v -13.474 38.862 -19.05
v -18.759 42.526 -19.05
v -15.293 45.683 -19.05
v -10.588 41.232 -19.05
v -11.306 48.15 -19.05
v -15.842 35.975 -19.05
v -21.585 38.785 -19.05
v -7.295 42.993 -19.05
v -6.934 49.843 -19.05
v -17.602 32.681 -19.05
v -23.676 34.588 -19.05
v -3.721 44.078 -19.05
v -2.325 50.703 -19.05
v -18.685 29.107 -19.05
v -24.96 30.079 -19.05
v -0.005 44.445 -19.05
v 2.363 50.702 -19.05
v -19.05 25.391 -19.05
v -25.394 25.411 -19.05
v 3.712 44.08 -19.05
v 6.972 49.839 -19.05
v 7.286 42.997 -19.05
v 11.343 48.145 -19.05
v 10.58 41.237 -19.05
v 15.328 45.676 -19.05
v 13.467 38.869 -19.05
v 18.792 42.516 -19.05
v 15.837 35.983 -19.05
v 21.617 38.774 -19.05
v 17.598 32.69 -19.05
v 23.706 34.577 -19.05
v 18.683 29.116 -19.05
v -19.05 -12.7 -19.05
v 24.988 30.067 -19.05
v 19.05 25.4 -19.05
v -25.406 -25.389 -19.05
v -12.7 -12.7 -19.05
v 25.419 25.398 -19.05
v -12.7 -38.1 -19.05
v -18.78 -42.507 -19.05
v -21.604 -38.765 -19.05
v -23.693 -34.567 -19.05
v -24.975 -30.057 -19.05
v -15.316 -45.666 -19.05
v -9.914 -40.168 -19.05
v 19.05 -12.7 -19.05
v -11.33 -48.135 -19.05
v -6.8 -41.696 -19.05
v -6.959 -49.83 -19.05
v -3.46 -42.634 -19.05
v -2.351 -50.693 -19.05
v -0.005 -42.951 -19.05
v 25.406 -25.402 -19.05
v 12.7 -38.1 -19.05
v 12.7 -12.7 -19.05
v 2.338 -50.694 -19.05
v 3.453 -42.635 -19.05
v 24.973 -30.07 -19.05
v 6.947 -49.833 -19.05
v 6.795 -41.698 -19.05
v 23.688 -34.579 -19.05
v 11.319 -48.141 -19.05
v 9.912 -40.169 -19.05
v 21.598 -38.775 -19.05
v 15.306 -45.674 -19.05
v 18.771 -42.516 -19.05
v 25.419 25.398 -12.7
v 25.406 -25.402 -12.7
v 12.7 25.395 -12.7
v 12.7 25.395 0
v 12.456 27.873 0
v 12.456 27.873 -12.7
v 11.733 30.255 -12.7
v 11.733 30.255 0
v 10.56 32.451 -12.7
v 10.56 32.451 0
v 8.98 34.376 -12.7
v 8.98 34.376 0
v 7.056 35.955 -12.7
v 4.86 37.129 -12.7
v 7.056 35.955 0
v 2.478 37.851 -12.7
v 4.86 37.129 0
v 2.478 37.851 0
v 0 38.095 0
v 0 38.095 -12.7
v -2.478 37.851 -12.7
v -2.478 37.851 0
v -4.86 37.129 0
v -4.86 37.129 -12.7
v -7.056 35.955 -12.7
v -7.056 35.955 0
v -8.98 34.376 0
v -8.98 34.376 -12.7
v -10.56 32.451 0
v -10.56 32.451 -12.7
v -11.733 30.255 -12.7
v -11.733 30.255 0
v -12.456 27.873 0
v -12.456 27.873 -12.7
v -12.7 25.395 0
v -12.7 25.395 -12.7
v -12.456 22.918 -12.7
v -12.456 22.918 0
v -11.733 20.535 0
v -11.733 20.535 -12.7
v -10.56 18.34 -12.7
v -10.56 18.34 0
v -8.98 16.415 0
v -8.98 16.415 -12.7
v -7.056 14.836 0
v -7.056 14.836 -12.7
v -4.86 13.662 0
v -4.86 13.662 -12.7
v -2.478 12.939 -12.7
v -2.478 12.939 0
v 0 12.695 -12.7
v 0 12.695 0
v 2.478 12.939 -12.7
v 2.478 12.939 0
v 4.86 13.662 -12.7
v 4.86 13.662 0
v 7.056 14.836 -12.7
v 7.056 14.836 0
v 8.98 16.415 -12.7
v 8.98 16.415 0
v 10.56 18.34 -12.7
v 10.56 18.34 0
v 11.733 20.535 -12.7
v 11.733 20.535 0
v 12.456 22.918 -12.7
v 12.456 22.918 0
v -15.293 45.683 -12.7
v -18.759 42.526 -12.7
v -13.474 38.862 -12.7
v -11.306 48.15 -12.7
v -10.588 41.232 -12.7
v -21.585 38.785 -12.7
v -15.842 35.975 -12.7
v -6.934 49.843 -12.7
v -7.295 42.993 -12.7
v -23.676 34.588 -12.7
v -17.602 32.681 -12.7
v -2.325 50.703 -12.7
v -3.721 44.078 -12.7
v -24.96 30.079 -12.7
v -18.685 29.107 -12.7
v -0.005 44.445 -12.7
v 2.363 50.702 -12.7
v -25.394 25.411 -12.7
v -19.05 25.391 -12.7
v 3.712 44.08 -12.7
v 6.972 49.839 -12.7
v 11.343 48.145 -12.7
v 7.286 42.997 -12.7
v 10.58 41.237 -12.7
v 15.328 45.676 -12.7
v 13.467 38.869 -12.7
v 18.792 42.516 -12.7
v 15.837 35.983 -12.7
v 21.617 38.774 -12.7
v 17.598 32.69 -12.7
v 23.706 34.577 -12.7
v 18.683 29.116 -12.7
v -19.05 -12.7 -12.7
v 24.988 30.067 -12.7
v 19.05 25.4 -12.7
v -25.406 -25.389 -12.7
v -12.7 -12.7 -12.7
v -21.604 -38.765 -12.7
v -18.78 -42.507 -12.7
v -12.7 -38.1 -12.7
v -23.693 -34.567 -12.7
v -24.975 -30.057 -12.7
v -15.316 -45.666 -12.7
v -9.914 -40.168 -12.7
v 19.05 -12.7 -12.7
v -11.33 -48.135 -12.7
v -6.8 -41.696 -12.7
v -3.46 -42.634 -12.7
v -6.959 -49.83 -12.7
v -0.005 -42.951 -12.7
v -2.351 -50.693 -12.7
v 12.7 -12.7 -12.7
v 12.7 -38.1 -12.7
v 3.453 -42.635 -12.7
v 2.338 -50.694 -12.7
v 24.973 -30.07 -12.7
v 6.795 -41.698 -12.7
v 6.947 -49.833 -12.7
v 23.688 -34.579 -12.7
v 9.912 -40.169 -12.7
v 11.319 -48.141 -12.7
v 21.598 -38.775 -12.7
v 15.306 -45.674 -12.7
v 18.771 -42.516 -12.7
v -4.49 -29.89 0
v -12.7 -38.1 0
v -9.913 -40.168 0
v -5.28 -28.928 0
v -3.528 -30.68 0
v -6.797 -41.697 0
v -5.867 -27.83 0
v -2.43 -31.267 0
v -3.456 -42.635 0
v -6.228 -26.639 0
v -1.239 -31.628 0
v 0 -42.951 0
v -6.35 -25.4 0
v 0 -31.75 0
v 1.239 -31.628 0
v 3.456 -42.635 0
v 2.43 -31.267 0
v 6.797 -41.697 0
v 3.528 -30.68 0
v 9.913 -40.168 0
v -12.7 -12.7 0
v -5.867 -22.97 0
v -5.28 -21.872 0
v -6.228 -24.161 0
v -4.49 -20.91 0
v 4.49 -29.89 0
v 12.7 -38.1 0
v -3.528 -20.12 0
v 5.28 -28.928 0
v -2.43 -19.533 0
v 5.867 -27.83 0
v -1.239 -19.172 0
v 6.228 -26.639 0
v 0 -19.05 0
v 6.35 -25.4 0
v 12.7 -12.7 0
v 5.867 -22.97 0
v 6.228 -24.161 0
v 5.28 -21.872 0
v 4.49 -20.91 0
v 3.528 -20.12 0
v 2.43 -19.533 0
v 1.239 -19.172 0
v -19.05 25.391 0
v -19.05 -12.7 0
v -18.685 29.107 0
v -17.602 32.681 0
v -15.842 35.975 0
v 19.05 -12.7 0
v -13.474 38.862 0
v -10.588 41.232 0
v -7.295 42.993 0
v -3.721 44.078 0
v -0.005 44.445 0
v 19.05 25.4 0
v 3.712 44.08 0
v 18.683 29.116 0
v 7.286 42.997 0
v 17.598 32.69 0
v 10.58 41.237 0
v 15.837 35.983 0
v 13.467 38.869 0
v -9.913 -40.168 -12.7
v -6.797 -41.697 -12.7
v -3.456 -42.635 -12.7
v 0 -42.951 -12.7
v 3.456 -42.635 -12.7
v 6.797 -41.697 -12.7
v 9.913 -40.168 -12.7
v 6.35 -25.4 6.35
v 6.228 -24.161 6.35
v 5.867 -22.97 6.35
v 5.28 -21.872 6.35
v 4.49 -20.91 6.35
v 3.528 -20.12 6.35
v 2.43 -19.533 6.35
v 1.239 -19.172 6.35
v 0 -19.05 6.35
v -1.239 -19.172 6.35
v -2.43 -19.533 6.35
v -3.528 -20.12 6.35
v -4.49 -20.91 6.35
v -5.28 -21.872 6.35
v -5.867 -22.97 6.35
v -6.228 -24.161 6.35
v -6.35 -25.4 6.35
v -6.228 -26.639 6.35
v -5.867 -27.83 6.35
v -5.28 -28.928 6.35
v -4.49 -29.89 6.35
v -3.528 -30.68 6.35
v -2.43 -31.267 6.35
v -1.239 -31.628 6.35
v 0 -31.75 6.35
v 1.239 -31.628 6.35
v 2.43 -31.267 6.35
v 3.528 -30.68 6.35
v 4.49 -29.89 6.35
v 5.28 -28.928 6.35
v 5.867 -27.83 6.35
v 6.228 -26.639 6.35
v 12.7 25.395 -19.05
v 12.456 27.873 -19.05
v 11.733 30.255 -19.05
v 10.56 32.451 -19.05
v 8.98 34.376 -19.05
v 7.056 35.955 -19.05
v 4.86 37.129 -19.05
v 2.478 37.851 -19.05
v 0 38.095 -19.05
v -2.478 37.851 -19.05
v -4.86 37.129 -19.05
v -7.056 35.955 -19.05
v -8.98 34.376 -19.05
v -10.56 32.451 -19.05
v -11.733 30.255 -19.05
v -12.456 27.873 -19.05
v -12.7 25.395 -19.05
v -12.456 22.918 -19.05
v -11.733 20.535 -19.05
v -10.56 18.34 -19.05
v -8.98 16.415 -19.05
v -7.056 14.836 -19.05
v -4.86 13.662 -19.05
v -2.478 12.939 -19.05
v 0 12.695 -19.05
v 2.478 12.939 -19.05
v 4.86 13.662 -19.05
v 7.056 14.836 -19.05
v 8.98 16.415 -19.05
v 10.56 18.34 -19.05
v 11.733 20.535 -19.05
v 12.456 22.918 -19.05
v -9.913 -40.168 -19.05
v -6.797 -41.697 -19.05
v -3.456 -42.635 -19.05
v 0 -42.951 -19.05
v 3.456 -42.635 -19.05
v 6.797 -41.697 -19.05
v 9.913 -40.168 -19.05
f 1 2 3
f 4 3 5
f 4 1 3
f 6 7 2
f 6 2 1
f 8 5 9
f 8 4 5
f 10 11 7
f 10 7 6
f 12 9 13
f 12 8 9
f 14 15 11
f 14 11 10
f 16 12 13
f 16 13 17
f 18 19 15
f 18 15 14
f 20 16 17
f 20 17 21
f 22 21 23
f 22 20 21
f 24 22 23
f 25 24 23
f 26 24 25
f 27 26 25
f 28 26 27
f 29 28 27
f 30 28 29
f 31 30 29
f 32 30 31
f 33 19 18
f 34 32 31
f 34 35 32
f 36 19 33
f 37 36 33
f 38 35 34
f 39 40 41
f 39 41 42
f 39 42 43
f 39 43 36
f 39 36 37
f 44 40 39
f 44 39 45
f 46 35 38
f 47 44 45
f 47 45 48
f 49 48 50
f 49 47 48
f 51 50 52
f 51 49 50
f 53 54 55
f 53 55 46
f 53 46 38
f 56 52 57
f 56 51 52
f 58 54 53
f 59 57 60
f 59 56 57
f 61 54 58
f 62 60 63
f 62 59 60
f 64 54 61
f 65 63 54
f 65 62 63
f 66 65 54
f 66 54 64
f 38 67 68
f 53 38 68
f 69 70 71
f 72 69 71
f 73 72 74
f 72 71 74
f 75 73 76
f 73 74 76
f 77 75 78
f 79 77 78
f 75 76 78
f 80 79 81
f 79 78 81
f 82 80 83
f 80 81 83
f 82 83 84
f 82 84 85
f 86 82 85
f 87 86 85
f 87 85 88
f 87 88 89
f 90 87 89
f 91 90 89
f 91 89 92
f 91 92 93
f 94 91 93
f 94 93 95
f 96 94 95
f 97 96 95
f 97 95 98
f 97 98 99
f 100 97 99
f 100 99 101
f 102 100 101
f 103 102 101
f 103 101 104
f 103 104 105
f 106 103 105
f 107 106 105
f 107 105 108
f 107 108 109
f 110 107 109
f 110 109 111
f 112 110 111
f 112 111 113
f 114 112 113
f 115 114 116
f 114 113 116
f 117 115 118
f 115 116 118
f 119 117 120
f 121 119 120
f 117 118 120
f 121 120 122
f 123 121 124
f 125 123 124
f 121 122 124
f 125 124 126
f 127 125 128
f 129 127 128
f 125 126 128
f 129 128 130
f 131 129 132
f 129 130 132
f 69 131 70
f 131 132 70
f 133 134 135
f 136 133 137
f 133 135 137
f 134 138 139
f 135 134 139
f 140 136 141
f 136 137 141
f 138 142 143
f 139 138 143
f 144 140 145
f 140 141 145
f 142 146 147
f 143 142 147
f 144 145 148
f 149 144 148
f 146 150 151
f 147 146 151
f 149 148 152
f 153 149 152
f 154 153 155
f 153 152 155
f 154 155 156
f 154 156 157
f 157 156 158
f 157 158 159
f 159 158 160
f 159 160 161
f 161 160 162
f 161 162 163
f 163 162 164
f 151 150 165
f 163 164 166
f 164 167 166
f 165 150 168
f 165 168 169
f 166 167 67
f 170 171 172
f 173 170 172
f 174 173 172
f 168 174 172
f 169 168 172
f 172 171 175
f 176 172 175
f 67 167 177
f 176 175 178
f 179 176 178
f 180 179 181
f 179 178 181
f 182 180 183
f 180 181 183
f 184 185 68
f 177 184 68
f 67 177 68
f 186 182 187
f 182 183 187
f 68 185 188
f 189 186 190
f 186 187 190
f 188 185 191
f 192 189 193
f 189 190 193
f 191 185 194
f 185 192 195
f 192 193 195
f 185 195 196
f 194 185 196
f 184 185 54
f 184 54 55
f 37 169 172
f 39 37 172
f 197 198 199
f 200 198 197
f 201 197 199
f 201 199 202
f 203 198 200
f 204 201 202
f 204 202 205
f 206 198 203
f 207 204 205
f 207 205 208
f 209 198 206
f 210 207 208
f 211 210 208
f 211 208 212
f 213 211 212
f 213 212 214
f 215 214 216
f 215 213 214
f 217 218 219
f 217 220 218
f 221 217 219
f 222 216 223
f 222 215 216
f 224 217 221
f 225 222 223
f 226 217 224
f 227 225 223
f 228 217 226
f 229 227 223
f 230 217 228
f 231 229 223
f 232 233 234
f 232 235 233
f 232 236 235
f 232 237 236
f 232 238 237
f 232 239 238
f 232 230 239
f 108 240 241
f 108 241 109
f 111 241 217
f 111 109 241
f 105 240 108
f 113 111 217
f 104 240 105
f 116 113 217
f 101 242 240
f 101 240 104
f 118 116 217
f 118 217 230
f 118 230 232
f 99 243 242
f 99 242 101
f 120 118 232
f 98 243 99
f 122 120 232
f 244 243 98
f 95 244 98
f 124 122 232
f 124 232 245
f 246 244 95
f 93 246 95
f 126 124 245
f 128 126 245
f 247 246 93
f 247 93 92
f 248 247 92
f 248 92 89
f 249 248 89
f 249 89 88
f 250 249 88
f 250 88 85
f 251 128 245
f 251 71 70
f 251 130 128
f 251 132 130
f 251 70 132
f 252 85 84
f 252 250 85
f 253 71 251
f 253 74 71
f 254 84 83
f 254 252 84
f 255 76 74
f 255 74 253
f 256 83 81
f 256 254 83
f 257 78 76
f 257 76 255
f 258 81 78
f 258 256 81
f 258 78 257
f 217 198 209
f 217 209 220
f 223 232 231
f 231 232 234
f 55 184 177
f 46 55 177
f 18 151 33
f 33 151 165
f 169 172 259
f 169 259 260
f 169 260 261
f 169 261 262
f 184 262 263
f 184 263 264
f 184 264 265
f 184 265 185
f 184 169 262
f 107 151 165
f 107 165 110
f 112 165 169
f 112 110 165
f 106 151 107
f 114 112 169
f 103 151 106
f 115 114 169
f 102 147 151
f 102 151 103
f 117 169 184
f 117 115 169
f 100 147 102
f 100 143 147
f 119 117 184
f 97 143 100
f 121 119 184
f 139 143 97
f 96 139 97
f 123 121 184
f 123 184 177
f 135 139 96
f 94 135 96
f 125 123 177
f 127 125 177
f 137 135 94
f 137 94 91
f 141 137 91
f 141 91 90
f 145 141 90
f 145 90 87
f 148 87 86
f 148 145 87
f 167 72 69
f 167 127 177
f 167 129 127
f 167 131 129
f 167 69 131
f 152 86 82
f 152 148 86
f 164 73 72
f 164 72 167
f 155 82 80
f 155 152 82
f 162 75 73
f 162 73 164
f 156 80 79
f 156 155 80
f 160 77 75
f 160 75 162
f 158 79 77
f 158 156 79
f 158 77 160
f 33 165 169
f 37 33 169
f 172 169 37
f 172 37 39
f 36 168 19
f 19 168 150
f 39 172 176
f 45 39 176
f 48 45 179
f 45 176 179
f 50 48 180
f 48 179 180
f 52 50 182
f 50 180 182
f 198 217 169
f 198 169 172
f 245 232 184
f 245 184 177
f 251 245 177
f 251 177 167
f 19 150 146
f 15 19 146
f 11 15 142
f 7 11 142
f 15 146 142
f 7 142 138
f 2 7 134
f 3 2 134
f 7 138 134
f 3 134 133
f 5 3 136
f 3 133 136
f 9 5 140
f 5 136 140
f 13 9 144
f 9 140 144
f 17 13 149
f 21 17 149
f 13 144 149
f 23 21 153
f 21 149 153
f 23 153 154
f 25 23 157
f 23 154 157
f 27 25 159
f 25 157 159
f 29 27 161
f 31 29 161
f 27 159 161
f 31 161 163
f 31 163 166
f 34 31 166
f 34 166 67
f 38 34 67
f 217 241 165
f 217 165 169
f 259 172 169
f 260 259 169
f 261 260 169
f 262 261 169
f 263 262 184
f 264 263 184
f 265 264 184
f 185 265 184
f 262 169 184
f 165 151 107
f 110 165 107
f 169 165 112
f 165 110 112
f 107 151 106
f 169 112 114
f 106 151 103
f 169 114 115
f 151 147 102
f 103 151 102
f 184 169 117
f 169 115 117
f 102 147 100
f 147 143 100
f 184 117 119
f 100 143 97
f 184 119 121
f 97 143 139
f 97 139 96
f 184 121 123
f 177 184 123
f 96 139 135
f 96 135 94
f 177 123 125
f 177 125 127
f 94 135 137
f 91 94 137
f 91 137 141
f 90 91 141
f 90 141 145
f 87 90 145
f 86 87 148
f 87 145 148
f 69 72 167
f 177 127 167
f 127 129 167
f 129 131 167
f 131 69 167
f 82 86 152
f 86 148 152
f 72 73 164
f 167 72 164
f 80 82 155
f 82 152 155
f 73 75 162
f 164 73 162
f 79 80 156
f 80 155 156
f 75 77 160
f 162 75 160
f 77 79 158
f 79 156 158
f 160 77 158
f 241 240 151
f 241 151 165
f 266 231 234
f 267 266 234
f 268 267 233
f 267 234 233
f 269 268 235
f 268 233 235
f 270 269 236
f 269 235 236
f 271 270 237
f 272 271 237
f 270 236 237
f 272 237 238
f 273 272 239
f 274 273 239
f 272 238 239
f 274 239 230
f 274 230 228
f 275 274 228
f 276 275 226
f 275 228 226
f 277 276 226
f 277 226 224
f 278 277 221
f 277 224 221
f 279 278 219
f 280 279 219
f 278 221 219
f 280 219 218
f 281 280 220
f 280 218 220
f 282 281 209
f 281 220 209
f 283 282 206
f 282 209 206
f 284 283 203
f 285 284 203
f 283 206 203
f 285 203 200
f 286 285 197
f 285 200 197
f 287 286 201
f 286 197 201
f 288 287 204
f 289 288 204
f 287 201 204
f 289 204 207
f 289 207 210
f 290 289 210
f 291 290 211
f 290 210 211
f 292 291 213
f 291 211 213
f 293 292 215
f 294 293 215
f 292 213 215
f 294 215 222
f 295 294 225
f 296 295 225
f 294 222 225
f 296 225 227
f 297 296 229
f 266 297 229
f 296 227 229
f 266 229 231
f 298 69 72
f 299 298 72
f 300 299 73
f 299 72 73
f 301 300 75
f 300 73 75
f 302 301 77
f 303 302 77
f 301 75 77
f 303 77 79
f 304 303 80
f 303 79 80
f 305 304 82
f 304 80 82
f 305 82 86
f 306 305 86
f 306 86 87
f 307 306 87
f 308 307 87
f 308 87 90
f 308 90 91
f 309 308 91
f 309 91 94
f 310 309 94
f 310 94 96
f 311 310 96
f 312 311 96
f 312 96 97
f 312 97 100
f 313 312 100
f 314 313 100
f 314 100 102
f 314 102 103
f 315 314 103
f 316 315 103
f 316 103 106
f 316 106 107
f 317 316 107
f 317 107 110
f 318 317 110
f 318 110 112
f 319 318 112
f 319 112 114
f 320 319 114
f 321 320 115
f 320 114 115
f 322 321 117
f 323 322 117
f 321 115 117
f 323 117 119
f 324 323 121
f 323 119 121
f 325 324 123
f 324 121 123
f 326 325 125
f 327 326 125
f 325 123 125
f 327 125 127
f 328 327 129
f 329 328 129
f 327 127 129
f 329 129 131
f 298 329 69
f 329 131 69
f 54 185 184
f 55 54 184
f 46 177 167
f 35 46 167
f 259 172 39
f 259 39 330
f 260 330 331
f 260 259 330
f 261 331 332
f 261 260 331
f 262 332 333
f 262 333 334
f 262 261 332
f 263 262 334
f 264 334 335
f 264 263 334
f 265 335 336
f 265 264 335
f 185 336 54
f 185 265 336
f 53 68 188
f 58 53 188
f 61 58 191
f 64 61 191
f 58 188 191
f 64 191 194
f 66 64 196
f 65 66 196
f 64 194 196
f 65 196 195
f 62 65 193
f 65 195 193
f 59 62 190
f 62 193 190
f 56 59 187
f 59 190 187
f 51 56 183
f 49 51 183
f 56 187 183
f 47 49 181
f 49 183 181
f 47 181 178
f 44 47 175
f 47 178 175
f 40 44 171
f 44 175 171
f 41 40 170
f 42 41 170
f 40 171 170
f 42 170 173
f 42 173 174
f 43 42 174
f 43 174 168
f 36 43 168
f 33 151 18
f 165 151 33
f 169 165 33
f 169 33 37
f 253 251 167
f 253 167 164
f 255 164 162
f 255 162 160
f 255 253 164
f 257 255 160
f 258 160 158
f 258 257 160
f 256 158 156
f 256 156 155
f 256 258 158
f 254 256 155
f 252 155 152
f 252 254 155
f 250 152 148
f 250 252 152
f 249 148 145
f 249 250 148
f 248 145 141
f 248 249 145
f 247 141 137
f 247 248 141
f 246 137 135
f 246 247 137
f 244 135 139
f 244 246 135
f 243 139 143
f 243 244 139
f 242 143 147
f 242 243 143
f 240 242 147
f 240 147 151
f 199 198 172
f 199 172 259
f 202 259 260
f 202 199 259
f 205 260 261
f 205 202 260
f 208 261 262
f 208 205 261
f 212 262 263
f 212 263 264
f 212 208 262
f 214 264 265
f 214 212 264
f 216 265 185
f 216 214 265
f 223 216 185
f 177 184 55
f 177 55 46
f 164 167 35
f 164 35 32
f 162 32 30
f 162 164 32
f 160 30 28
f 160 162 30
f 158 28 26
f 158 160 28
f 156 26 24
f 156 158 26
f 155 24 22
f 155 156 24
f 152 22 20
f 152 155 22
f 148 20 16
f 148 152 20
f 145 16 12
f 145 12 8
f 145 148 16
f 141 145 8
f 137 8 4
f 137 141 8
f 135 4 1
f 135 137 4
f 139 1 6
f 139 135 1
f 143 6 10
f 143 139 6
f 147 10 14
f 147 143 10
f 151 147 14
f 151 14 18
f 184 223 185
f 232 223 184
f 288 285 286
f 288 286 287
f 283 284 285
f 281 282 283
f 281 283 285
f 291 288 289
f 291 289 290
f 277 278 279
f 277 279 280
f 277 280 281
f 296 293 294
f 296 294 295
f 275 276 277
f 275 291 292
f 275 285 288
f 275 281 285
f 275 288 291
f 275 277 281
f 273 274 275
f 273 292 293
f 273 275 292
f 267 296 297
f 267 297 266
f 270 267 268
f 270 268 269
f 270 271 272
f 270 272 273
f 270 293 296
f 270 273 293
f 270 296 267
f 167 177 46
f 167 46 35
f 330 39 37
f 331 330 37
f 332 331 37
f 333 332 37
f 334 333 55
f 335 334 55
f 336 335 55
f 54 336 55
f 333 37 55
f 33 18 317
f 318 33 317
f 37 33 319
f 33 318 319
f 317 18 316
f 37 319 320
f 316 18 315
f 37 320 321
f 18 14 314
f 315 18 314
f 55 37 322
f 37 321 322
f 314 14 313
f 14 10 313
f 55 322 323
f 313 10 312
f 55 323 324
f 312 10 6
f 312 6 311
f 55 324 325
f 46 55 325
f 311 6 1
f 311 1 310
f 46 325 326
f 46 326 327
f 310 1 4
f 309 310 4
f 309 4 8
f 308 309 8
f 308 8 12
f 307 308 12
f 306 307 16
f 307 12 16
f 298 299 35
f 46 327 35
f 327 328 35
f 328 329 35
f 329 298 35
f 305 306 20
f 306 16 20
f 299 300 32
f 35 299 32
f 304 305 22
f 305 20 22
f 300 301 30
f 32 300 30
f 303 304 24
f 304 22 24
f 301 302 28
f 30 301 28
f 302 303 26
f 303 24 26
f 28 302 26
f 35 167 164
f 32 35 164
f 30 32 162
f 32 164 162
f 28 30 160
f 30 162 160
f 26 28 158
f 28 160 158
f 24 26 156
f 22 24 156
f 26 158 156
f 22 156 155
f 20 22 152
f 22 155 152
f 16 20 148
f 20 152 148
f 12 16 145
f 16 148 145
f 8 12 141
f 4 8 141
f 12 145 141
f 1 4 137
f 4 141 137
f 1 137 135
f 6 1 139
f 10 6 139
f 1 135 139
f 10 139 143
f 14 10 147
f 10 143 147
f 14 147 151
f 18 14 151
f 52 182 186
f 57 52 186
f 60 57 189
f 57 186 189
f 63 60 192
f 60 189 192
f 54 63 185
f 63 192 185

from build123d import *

# Parameters (mm, degrees)
F1_DEPTH = 12.7
F2_R     = 6.35
F3_DEPTH = 6.35
F5_DEPTH = 6.35
F6_DEPTH = 6.35
F7_R     = 12.7
F8_DEPTH = 19.051


# Not quite as in the source:
# - ends of sketch curves that miss each other by under 0.0002 mm in the source are joined


with BuildPart() as f1:
    # F0 (on Top) → F1 (new body)
    with BuildSketch(Plane.XY):
        with BuildLine():
            Line((19.05, -12.7), (19.05, 25.4))
            ThreePointArc((19.05, 25.4), (-0.0047443873, 44.4452550218), (-19.0499994092, 25.3905112253))
            Line((-19.0499994092, 25.3905112253), (-19.05, -12.7))
            Line((-19.05, -12.7), (-12.7, -12.7))
            Line((-12.7, -12.7), (-12.7, -38.1))
            ThreePointArc((-12.7, -38.1), (0, -42.9509683429), (12.7, -38.1))
            Line((12.7, -38.1), (12.7, -12.7))
            Line((12.7, -12.7), (19.05, -12.7))
        make_face()
    extrude(amount=-F1_DEPTH)

    # F2 (on face) → F3 (join)
    with BuildSketch(Plane.XY):
        with Locations((0, -25.4)):
            Circle(F2_R)
    extrude(amount=F3_DEPTH)


with BuildPart() as f5:
    # F4 (on face) → F5 (new body)
    with BuildSketch(Plane(origin=(0, 0, -12.7), x_dir=(1, 0, 0), z_dir=(0, 0, -1))):
        with BuildLine():
            Line((25.4189755796, -25.3984153871), (25.4063238802, 25.4015830374))
            ThreePointArc((25.4063238802, 25.4015830374), (-0.0063274248, 50.8015794928), (-25.4063238802, 25.3889281877))
            Line((-25.4063238802, 25.3889281877), (-25.3936721808, -25.4110702368))
            ThreePointArc((-25.3936721808, -25.4110702368), (0.0189791242, -50.8110666922), (25.4189755796, -25.3984153871))
        make_face()
        with BuildLine():
            Line((12.7, 38.1), (12.7, 25.3952556126))
            Line((12.7, 25.3952556126), (12.7, 12.7))
            Line((12.7, 12.7), (19.05, 12.7))
            Line((19.05, 12.7), (19.05, -25.4))
            ThreePointArc((19.05, -25.4), (-0.0047440919, -44.4452550219), (-19.0499994092, -25.3905112253))
            Line((-19.0499994092, -25.3905112253), (-19.05, 12.7))
            Line((-19.05, 12.7), (-12.7, 12.7))
            Line((-12.7, 12.7), (-12.7, 25.3952556126))
            Line((-12.7, 25.3952556126), (-12.7, 38.1))
            ThreePointArc((-12.7, 38.1), (-6.7996767952, 41.696105192), (-0.0047443873, 42.9509677521))
            ThreePointArc((-0.0047443873, 42.9509677521), (6.7952447197, 41.6977980942), (12.7, 38.1))
        make_face(mode=Mode.SUBTRACT)
    extrude(amount=F5_DEPTH)


with BuildPart() as f6:
    # F6 (new): a face of the model
    f6_faces = [f1.part.faces().sort_by_distance(p)[0] for p in [
        (1.391e-07, 3.0992224533, -12.7),
    ]]
    extrude(f6_faces, amount=F6_DEPTH)


with BuildPart() as f8_tool:
    # F7 (on face) → F8 (new body, through all)
    with BuildSketch(Plane.XY):
        with Locations((2.954e-07, 25.3952556127)):
            Circle(F7_R)
    extrude(amount=-F8_DEPTH)


with BuildPart() as f1_1:
    add(f1.part)

    # F8: cut by f8_tool
    add(f8_tool.part, mode=Mode.SUBTRACT)


with BuildPart() as f6_1:
    add(f6.part)

    # F8: cut by f8_tool
    add(f8_tool.part, mode=Mode.SUBTRACT)


solid = Compound([f5.part, f1_1.part, f6_1.part])
